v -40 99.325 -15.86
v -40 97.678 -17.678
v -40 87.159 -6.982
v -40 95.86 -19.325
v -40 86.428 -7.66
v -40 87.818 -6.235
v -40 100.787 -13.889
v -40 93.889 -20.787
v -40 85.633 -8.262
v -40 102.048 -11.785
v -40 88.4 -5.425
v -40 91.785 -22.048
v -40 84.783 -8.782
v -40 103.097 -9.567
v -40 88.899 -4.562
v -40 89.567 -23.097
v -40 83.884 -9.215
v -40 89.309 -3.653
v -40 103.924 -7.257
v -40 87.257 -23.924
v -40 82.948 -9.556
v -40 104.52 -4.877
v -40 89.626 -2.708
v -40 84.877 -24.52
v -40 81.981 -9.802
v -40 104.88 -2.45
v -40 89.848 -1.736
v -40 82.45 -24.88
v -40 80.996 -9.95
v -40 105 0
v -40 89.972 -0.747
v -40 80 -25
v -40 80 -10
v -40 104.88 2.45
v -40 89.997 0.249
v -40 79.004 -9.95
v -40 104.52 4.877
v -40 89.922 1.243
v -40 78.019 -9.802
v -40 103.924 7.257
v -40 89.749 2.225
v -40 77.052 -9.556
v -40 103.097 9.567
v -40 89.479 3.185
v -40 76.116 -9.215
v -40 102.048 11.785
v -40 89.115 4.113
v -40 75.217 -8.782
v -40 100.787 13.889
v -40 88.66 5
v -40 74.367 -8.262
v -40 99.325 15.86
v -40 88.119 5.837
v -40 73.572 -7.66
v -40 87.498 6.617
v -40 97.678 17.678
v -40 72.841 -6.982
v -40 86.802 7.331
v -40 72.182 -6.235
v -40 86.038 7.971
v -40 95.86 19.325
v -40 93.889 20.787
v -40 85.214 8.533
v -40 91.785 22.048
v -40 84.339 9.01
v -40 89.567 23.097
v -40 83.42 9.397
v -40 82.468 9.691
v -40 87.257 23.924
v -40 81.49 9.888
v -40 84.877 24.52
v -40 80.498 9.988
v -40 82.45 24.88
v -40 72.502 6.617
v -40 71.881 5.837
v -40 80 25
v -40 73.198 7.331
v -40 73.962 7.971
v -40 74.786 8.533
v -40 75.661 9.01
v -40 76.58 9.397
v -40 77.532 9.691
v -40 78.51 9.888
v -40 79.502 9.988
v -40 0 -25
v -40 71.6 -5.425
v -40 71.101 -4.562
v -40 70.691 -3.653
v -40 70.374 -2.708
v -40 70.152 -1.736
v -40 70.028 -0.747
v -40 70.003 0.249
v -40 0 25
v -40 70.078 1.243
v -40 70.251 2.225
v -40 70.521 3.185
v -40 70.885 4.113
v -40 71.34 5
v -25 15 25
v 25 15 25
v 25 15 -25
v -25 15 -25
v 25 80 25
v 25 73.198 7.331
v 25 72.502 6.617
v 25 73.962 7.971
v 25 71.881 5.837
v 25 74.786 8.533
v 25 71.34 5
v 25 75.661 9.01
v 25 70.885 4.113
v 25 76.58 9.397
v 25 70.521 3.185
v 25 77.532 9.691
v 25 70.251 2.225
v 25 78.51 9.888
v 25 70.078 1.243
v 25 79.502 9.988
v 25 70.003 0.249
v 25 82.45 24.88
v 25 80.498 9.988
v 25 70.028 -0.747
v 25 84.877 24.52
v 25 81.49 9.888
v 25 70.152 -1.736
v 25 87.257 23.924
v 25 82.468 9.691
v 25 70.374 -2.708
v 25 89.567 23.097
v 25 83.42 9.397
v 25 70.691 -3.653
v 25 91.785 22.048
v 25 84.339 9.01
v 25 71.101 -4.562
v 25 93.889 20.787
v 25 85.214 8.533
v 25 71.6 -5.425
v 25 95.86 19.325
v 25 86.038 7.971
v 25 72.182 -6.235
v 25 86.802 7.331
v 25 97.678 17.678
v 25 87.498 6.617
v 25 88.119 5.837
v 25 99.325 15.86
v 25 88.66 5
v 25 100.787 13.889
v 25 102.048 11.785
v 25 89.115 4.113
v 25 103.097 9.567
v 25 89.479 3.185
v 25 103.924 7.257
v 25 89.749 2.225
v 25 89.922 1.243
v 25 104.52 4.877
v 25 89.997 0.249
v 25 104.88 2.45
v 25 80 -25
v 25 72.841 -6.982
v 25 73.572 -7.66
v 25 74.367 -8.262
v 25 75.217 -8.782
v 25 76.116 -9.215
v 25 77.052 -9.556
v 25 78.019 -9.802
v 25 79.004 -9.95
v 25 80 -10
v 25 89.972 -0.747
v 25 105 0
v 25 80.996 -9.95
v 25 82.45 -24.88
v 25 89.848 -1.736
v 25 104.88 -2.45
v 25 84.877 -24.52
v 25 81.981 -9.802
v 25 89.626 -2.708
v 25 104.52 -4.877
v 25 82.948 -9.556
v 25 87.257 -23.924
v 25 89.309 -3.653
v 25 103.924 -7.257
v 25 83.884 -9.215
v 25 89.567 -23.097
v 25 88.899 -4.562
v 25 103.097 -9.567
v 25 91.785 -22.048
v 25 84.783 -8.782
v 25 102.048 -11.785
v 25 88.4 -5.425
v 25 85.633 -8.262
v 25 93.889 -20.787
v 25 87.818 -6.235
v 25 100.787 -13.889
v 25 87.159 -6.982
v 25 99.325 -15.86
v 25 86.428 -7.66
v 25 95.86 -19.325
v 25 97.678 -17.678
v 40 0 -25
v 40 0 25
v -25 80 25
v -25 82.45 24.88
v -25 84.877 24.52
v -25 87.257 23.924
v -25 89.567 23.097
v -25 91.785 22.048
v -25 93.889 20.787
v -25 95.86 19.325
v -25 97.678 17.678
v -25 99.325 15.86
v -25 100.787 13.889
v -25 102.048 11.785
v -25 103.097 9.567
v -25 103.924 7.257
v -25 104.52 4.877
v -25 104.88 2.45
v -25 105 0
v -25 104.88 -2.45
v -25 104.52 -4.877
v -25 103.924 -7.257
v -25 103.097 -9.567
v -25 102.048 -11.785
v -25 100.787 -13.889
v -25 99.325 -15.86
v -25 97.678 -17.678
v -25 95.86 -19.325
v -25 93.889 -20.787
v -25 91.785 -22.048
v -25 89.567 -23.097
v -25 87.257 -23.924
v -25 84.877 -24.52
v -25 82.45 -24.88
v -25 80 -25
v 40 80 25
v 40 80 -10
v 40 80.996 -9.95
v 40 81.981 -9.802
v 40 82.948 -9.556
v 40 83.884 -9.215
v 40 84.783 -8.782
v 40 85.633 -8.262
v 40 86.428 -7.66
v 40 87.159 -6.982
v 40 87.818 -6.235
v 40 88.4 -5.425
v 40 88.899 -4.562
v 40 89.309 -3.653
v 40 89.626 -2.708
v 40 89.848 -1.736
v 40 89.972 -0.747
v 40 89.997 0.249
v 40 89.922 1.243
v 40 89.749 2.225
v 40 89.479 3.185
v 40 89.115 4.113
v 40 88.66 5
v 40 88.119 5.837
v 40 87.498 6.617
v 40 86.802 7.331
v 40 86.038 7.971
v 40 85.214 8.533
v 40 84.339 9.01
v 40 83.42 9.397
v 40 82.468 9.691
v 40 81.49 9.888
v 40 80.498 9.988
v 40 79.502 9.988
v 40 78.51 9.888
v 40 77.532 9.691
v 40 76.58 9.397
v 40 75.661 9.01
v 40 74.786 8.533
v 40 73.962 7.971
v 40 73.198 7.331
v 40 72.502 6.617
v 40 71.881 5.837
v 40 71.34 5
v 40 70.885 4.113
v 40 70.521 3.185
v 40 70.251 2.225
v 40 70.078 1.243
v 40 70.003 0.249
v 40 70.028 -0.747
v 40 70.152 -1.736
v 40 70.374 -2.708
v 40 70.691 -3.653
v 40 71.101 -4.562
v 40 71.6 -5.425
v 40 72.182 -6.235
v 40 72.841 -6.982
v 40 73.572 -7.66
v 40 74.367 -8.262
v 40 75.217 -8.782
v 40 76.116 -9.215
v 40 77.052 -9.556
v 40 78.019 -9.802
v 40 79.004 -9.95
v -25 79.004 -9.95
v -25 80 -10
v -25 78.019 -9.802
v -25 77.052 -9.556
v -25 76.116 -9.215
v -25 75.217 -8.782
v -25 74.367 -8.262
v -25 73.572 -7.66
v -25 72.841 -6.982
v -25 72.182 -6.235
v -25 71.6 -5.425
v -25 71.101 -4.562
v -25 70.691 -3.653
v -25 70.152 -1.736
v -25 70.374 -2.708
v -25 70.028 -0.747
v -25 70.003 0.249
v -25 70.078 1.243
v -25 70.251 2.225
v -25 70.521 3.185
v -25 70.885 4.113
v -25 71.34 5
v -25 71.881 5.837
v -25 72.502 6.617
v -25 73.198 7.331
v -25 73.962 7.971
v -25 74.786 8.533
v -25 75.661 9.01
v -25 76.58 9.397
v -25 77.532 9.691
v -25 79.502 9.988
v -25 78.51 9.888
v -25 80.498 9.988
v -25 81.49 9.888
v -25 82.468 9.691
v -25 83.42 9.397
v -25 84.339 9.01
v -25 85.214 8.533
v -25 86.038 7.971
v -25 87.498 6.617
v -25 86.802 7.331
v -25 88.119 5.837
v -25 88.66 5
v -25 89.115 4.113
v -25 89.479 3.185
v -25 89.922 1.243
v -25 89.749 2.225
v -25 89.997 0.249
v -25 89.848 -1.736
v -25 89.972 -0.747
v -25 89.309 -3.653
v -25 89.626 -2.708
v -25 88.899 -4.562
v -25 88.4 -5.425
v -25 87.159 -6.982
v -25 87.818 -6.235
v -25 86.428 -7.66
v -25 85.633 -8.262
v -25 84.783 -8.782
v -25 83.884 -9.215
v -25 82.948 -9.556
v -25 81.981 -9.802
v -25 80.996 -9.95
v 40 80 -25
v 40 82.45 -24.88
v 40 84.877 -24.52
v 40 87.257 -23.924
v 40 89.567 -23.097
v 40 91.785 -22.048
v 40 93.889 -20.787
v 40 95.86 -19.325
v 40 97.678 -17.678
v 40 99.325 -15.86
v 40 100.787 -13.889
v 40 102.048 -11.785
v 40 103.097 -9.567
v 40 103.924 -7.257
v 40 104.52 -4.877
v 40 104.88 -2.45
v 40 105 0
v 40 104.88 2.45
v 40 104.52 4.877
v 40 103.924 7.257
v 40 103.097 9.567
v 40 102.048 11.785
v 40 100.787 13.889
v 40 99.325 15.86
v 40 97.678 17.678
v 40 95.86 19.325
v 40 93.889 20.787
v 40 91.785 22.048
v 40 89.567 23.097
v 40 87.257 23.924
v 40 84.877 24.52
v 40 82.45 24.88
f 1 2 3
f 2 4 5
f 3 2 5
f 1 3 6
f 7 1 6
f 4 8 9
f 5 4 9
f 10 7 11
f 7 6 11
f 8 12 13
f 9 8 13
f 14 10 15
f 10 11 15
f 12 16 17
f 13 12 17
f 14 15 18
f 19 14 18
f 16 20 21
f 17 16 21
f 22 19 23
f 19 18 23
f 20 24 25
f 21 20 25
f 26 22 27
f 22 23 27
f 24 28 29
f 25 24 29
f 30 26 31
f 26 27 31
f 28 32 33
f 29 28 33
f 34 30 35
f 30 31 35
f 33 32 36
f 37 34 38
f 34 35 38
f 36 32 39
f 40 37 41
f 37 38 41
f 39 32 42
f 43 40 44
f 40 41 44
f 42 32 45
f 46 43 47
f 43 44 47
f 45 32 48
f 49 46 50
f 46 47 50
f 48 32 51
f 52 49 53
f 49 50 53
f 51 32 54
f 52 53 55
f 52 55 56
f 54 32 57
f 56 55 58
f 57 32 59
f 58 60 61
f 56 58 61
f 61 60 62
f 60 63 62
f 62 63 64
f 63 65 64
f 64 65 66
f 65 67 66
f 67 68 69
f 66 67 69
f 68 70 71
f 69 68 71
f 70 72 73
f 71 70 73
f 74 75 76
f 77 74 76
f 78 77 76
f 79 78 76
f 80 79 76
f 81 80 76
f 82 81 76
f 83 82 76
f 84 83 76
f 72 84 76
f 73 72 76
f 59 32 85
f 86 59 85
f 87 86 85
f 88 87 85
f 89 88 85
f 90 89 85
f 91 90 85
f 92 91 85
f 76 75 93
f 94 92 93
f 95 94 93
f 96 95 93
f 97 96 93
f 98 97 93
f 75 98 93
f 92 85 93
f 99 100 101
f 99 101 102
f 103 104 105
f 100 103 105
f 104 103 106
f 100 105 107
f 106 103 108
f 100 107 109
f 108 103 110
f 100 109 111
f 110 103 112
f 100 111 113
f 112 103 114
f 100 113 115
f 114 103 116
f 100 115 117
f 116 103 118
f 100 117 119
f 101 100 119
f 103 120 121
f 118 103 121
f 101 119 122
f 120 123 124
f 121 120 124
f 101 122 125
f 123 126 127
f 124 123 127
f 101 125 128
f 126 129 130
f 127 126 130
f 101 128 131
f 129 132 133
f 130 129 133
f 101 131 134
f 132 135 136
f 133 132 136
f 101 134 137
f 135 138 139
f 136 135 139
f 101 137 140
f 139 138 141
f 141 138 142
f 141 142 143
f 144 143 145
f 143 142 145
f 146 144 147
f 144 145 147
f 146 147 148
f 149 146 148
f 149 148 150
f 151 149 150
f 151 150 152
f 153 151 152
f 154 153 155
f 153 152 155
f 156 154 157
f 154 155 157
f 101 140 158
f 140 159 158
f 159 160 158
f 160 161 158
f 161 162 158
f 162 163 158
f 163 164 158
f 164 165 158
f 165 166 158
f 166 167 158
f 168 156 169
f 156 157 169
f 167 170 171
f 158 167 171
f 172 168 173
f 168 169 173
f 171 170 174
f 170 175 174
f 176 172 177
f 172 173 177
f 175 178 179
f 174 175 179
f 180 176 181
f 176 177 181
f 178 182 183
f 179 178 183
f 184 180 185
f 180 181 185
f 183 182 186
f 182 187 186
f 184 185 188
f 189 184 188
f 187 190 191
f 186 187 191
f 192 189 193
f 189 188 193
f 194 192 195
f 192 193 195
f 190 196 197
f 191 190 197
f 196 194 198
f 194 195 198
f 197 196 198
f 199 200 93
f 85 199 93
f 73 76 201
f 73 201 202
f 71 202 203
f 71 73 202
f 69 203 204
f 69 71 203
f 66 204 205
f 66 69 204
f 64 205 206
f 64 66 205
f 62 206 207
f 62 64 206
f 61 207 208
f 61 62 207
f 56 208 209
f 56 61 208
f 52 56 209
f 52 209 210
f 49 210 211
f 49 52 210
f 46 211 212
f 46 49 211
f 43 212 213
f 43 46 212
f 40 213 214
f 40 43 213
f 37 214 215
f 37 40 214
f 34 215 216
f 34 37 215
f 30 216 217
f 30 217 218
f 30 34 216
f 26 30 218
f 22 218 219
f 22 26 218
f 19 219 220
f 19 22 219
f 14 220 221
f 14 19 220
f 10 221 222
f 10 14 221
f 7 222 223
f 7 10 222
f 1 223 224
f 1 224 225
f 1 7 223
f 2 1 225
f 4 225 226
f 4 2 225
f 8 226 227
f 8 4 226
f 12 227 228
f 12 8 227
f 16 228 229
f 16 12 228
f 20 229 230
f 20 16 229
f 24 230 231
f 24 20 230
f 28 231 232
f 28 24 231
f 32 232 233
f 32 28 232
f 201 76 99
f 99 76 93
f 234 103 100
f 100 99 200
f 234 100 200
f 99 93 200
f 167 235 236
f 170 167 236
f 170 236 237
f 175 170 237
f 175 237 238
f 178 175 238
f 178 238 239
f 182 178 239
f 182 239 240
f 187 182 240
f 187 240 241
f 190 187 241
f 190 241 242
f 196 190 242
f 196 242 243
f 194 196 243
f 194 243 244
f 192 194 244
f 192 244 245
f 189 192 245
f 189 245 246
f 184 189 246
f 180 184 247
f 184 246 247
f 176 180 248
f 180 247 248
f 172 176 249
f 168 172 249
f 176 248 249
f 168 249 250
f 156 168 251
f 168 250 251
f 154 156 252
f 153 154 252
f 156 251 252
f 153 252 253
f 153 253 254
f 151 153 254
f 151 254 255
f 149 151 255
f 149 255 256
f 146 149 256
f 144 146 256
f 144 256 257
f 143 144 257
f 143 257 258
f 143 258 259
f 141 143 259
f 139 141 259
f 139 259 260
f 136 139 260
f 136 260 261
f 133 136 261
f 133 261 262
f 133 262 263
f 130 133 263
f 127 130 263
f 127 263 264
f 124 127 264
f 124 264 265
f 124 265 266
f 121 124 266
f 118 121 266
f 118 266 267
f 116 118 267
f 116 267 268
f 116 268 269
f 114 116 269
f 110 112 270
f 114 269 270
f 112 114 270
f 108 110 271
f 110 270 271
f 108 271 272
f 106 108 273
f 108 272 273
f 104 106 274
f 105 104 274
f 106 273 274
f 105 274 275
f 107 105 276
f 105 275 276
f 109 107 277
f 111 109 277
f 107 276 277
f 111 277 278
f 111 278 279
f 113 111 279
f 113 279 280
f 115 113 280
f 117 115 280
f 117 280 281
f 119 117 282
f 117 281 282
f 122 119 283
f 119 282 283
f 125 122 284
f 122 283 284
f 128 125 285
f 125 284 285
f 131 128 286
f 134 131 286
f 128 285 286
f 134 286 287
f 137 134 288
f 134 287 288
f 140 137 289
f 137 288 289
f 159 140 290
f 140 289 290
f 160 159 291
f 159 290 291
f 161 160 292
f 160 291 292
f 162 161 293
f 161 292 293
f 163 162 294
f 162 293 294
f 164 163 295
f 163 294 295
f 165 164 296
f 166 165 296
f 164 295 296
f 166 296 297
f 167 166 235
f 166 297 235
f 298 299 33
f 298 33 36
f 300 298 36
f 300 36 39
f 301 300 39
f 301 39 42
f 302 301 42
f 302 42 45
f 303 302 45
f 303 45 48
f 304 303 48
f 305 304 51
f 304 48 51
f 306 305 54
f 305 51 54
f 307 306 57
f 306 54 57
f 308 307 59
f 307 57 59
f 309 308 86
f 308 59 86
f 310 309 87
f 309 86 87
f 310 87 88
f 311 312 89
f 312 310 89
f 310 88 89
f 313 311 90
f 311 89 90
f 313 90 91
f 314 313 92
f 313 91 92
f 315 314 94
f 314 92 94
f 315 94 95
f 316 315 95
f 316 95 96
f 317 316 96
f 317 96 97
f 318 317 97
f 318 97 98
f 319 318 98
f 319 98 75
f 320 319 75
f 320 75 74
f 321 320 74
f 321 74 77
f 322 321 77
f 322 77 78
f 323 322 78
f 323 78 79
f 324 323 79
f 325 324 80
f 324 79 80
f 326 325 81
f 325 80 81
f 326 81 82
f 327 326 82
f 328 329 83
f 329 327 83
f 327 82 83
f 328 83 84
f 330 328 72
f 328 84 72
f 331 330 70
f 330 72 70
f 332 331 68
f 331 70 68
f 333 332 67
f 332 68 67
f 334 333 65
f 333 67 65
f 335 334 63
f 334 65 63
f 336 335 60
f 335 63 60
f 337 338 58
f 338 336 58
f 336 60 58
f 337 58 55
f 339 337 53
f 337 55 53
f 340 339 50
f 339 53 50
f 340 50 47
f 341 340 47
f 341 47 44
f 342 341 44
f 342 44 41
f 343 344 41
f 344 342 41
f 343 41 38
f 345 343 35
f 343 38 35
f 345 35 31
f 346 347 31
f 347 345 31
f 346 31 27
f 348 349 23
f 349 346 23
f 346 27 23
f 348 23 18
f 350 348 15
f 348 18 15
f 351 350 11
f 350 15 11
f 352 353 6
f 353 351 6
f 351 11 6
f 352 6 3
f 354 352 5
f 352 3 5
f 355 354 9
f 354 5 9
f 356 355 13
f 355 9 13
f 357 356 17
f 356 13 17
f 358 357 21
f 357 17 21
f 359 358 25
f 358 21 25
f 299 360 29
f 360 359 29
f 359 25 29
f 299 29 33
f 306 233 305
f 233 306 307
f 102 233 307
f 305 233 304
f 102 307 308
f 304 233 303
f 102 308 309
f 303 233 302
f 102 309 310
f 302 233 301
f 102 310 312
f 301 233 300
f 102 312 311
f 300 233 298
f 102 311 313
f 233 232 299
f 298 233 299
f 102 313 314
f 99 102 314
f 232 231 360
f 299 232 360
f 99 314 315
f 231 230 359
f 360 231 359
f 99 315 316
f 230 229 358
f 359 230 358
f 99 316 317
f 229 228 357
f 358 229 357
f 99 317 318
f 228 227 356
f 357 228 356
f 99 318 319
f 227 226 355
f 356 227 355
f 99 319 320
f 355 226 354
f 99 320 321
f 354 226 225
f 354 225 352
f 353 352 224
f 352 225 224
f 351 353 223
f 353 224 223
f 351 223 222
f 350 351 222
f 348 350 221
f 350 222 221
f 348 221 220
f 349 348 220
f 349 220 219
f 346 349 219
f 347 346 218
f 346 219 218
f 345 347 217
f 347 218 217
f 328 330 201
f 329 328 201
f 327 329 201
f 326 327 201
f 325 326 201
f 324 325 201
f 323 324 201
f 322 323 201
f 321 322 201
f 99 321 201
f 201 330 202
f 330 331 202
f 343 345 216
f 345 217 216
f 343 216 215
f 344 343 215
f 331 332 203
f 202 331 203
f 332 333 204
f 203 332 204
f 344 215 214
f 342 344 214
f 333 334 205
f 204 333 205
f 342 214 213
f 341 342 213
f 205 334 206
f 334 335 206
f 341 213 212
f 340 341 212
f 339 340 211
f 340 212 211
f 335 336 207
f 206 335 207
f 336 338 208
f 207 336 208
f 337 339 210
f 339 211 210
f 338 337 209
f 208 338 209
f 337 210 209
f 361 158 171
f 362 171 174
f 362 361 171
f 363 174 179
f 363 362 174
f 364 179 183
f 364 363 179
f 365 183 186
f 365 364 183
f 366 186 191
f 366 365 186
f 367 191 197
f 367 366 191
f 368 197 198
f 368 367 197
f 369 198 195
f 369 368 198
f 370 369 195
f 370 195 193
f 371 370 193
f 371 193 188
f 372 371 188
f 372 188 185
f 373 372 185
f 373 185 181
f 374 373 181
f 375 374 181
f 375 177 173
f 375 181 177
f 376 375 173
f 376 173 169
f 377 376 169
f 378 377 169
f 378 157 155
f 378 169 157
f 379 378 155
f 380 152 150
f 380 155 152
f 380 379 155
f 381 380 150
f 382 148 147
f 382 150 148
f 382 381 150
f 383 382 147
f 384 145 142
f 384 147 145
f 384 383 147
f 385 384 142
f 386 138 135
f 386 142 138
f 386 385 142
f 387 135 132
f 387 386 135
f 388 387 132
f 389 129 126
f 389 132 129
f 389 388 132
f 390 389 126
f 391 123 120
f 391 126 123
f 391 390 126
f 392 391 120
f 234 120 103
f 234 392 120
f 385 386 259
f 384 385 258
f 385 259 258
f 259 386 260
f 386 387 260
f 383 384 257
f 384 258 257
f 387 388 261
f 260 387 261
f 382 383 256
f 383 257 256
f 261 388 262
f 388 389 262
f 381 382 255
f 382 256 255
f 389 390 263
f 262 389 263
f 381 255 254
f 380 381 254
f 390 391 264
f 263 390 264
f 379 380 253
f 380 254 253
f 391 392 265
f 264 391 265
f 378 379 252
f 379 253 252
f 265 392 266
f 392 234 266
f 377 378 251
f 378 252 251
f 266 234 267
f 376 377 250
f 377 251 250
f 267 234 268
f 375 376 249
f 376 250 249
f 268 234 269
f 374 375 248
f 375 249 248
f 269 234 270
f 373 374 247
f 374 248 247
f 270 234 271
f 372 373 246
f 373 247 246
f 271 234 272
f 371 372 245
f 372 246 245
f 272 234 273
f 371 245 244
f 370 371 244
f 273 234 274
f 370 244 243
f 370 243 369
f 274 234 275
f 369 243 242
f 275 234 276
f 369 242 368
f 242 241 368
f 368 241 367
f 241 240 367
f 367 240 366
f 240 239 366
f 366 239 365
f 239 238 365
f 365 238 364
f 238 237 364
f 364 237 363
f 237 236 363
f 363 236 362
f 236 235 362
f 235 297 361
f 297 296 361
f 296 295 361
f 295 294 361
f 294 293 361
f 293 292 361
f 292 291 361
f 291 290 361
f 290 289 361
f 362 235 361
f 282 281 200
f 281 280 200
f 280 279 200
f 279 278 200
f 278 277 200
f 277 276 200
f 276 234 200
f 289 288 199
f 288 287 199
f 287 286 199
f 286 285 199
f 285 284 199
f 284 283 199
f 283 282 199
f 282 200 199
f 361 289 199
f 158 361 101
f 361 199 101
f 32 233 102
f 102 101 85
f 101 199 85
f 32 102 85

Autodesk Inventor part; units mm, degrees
ref_plane "YZ Plane" through (0, 0, 0) normal (1, 0, 0) x (0, 1, 0)
ref_plane "XZ Plane" through (0, 0, 0) normal (0, 1, 0) x (-1, 0, 0)
ref_plane "XY Plane" through (0, 0, 0) normal (0, 0, 1) x (1, 0, 0)
sketch "Sketch1" plane through (0, 0, 0) normal (0, 1, 0) x (-1, 0, 0)
  line L0 (56, 0) -> (-56, 0) projected
  line L1 (0, -35) -> (0, 35) projected
  line L2 (40, 25) -> (-40, 25)
  line L3 (-40, 25) -> (-40, -25)
  line L4 (-40, -25) -> (40, -25)
  line L5 (40, -25) -> (40, 25)
  point P0 (0, 0)
  point P1 (40, 0)
  point P2 (0, -25)
  dimension "d0" = 50
  dimension "d1" = 80
extrude "Extrusion1" add sketch "Sketch1" along normal blind 15
sketch "Sketch2" plane through (40, 0, 25) normal (1, 0, 0) x (0, 0, -1)
  line L0 (0, 0) -> (50, 0) projected
  line L1 (50, 0) -> (50, 15) projected
  line L2 (0, 15) -> (50, 15) projected
  line L3 (0, 0) -> (0, 15) projected
  line L4 (0, 0) -> (50, 0)
  line L5 (50, 0) -> (50, 80)
  line L6 (0, 80) -> (0, 0)
  arc A0 (50, 80) -> (0, 80) centre (25, 80) ccw
  line L7 (0, 0) -> (50, 0) projected
  circle A1 centre (25, 80) radius 10
  line L8 (25, -19) -> (25, 114) projected
  point P0 (25, 0)
  dimension "d5" = 50
  dimension "d6" = 20
  dimension "d7" = 80
  dimension "d8" = 50
extrude "Extrusion2" add sketch "Sketch2" against normal blind 15 contours L3 L2 L8 L0 | L8 L2 L1 L0 | L6 A0 L8 A1 L2 | L8 A1 A0 L5 L2
mirror "Mirror1" about plane through (0, 0, 0) normal (1, 0, 0) of "Extrusion2"
properties part number "Base_Block" material "Steel, Carbon"
